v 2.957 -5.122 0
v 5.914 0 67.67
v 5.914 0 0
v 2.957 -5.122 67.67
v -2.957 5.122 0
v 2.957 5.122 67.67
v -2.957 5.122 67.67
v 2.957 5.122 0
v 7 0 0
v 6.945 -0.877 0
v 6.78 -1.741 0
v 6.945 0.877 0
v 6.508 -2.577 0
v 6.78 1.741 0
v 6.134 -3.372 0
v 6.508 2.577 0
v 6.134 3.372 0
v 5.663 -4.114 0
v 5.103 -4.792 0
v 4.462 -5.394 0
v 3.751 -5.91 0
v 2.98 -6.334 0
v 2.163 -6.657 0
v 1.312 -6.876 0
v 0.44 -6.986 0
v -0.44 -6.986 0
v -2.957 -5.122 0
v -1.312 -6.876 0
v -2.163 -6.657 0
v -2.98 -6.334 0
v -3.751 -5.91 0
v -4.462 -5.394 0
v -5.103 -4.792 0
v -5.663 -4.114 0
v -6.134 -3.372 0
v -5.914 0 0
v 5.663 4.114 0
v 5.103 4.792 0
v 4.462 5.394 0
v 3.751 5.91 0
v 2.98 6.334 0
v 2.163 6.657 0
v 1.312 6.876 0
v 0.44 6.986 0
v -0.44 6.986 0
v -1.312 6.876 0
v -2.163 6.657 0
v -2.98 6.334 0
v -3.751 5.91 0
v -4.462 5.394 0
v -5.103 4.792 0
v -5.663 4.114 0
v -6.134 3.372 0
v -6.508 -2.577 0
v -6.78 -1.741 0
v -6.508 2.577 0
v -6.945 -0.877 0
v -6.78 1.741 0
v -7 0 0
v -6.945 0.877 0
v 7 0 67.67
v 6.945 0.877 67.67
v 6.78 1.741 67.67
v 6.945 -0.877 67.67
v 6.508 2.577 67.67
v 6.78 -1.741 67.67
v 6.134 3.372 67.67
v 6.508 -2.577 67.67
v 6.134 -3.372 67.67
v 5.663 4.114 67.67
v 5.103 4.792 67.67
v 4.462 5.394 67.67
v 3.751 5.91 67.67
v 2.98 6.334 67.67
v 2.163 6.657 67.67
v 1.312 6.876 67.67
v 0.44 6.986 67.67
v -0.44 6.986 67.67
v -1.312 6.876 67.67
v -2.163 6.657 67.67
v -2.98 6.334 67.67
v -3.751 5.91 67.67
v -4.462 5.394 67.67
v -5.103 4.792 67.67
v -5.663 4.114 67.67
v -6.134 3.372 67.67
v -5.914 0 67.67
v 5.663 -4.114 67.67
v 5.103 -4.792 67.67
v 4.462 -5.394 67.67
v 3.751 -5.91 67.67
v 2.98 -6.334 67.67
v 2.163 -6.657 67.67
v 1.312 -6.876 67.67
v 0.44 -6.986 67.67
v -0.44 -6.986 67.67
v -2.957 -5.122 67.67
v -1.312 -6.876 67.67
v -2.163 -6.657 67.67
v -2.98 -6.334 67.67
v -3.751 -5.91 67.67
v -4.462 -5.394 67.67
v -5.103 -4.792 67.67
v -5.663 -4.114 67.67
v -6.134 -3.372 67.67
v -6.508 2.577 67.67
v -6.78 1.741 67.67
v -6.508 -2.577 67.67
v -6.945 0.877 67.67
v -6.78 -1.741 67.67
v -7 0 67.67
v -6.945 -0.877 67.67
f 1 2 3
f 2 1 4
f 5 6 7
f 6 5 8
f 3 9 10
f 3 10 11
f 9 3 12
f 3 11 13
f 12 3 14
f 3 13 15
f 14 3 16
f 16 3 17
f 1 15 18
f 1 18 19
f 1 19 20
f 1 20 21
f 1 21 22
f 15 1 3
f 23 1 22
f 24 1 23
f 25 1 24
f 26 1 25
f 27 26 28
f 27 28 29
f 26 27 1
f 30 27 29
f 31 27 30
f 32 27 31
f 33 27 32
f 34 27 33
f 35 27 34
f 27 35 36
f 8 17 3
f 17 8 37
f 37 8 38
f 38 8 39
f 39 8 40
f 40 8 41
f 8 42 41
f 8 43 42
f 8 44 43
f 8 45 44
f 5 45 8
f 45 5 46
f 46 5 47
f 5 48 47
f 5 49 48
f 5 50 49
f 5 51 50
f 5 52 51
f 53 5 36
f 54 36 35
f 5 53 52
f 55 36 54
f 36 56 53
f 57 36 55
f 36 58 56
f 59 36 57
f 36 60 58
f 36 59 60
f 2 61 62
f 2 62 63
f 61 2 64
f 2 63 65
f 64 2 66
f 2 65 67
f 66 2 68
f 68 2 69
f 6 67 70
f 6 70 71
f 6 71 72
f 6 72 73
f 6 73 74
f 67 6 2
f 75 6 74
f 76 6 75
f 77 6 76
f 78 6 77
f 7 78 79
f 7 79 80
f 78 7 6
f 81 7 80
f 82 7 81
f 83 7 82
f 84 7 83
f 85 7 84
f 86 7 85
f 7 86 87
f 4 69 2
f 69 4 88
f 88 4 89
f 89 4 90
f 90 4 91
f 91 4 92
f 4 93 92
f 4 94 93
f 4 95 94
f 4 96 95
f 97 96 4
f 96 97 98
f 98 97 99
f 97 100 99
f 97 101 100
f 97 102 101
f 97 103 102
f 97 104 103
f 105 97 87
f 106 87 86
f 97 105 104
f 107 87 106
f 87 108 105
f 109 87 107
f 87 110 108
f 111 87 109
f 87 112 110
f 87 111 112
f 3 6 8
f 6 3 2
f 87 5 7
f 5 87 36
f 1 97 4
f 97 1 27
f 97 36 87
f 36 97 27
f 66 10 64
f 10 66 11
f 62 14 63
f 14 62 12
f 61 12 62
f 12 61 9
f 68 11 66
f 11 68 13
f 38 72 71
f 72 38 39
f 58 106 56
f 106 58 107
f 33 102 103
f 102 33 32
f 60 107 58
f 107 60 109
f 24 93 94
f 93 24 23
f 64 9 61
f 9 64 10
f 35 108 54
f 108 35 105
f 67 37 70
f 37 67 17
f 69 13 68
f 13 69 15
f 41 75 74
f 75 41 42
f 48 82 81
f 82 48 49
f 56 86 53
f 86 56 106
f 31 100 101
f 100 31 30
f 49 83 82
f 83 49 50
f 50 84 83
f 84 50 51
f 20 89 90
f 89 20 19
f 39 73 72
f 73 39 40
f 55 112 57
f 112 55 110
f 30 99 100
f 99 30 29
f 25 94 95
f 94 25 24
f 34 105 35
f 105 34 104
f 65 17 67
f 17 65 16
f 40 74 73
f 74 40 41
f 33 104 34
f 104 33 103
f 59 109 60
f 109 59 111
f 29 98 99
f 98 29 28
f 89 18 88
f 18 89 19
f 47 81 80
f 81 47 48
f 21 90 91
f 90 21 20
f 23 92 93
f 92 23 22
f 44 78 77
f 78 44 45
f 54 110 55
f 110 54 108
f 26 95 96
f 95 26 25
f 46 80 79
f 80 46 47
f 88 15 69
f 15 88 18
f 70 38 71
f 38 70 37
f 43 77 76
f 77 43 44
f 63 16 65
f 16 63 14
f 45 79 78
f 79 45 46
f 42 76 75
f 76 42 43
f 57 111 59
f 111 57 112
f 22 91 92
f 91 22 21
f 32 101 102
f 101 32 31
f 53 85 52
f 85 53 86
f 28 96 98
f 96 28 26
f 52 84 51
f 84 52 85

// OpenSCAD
$fn = 50;


difference() {
	union() {
		cylinder(h = 67.6700000000, r = 7.0000000000);
	}
	union() {
		translate(v = [0, 0, 0]) {
			rotate(a = [0, 0, 0]) {
				difference() {
					union() {
						#linear_extrude(height = 67.6700000000) {
							polygon(points = [[5.9142500000, 0.0000000000], [2.9571250000, 5.1218907443], [-2.9571250000, 5.1218907443], [-5.9142500000, 0.0000000000], [-2.9571250000, -5.1218907443], [2.9571250000, -5.1218907443]]);
						}
					}
					union();
				}
			}
		}
		translate(v = [0, 0, -100]) {
			cylinder(h = 200, r = 3.2500000000);
		}
		translate(v = [0, 0, -100]) {
			cylinder(h = 200, r = 1.8000000000);
		}
	}
}
